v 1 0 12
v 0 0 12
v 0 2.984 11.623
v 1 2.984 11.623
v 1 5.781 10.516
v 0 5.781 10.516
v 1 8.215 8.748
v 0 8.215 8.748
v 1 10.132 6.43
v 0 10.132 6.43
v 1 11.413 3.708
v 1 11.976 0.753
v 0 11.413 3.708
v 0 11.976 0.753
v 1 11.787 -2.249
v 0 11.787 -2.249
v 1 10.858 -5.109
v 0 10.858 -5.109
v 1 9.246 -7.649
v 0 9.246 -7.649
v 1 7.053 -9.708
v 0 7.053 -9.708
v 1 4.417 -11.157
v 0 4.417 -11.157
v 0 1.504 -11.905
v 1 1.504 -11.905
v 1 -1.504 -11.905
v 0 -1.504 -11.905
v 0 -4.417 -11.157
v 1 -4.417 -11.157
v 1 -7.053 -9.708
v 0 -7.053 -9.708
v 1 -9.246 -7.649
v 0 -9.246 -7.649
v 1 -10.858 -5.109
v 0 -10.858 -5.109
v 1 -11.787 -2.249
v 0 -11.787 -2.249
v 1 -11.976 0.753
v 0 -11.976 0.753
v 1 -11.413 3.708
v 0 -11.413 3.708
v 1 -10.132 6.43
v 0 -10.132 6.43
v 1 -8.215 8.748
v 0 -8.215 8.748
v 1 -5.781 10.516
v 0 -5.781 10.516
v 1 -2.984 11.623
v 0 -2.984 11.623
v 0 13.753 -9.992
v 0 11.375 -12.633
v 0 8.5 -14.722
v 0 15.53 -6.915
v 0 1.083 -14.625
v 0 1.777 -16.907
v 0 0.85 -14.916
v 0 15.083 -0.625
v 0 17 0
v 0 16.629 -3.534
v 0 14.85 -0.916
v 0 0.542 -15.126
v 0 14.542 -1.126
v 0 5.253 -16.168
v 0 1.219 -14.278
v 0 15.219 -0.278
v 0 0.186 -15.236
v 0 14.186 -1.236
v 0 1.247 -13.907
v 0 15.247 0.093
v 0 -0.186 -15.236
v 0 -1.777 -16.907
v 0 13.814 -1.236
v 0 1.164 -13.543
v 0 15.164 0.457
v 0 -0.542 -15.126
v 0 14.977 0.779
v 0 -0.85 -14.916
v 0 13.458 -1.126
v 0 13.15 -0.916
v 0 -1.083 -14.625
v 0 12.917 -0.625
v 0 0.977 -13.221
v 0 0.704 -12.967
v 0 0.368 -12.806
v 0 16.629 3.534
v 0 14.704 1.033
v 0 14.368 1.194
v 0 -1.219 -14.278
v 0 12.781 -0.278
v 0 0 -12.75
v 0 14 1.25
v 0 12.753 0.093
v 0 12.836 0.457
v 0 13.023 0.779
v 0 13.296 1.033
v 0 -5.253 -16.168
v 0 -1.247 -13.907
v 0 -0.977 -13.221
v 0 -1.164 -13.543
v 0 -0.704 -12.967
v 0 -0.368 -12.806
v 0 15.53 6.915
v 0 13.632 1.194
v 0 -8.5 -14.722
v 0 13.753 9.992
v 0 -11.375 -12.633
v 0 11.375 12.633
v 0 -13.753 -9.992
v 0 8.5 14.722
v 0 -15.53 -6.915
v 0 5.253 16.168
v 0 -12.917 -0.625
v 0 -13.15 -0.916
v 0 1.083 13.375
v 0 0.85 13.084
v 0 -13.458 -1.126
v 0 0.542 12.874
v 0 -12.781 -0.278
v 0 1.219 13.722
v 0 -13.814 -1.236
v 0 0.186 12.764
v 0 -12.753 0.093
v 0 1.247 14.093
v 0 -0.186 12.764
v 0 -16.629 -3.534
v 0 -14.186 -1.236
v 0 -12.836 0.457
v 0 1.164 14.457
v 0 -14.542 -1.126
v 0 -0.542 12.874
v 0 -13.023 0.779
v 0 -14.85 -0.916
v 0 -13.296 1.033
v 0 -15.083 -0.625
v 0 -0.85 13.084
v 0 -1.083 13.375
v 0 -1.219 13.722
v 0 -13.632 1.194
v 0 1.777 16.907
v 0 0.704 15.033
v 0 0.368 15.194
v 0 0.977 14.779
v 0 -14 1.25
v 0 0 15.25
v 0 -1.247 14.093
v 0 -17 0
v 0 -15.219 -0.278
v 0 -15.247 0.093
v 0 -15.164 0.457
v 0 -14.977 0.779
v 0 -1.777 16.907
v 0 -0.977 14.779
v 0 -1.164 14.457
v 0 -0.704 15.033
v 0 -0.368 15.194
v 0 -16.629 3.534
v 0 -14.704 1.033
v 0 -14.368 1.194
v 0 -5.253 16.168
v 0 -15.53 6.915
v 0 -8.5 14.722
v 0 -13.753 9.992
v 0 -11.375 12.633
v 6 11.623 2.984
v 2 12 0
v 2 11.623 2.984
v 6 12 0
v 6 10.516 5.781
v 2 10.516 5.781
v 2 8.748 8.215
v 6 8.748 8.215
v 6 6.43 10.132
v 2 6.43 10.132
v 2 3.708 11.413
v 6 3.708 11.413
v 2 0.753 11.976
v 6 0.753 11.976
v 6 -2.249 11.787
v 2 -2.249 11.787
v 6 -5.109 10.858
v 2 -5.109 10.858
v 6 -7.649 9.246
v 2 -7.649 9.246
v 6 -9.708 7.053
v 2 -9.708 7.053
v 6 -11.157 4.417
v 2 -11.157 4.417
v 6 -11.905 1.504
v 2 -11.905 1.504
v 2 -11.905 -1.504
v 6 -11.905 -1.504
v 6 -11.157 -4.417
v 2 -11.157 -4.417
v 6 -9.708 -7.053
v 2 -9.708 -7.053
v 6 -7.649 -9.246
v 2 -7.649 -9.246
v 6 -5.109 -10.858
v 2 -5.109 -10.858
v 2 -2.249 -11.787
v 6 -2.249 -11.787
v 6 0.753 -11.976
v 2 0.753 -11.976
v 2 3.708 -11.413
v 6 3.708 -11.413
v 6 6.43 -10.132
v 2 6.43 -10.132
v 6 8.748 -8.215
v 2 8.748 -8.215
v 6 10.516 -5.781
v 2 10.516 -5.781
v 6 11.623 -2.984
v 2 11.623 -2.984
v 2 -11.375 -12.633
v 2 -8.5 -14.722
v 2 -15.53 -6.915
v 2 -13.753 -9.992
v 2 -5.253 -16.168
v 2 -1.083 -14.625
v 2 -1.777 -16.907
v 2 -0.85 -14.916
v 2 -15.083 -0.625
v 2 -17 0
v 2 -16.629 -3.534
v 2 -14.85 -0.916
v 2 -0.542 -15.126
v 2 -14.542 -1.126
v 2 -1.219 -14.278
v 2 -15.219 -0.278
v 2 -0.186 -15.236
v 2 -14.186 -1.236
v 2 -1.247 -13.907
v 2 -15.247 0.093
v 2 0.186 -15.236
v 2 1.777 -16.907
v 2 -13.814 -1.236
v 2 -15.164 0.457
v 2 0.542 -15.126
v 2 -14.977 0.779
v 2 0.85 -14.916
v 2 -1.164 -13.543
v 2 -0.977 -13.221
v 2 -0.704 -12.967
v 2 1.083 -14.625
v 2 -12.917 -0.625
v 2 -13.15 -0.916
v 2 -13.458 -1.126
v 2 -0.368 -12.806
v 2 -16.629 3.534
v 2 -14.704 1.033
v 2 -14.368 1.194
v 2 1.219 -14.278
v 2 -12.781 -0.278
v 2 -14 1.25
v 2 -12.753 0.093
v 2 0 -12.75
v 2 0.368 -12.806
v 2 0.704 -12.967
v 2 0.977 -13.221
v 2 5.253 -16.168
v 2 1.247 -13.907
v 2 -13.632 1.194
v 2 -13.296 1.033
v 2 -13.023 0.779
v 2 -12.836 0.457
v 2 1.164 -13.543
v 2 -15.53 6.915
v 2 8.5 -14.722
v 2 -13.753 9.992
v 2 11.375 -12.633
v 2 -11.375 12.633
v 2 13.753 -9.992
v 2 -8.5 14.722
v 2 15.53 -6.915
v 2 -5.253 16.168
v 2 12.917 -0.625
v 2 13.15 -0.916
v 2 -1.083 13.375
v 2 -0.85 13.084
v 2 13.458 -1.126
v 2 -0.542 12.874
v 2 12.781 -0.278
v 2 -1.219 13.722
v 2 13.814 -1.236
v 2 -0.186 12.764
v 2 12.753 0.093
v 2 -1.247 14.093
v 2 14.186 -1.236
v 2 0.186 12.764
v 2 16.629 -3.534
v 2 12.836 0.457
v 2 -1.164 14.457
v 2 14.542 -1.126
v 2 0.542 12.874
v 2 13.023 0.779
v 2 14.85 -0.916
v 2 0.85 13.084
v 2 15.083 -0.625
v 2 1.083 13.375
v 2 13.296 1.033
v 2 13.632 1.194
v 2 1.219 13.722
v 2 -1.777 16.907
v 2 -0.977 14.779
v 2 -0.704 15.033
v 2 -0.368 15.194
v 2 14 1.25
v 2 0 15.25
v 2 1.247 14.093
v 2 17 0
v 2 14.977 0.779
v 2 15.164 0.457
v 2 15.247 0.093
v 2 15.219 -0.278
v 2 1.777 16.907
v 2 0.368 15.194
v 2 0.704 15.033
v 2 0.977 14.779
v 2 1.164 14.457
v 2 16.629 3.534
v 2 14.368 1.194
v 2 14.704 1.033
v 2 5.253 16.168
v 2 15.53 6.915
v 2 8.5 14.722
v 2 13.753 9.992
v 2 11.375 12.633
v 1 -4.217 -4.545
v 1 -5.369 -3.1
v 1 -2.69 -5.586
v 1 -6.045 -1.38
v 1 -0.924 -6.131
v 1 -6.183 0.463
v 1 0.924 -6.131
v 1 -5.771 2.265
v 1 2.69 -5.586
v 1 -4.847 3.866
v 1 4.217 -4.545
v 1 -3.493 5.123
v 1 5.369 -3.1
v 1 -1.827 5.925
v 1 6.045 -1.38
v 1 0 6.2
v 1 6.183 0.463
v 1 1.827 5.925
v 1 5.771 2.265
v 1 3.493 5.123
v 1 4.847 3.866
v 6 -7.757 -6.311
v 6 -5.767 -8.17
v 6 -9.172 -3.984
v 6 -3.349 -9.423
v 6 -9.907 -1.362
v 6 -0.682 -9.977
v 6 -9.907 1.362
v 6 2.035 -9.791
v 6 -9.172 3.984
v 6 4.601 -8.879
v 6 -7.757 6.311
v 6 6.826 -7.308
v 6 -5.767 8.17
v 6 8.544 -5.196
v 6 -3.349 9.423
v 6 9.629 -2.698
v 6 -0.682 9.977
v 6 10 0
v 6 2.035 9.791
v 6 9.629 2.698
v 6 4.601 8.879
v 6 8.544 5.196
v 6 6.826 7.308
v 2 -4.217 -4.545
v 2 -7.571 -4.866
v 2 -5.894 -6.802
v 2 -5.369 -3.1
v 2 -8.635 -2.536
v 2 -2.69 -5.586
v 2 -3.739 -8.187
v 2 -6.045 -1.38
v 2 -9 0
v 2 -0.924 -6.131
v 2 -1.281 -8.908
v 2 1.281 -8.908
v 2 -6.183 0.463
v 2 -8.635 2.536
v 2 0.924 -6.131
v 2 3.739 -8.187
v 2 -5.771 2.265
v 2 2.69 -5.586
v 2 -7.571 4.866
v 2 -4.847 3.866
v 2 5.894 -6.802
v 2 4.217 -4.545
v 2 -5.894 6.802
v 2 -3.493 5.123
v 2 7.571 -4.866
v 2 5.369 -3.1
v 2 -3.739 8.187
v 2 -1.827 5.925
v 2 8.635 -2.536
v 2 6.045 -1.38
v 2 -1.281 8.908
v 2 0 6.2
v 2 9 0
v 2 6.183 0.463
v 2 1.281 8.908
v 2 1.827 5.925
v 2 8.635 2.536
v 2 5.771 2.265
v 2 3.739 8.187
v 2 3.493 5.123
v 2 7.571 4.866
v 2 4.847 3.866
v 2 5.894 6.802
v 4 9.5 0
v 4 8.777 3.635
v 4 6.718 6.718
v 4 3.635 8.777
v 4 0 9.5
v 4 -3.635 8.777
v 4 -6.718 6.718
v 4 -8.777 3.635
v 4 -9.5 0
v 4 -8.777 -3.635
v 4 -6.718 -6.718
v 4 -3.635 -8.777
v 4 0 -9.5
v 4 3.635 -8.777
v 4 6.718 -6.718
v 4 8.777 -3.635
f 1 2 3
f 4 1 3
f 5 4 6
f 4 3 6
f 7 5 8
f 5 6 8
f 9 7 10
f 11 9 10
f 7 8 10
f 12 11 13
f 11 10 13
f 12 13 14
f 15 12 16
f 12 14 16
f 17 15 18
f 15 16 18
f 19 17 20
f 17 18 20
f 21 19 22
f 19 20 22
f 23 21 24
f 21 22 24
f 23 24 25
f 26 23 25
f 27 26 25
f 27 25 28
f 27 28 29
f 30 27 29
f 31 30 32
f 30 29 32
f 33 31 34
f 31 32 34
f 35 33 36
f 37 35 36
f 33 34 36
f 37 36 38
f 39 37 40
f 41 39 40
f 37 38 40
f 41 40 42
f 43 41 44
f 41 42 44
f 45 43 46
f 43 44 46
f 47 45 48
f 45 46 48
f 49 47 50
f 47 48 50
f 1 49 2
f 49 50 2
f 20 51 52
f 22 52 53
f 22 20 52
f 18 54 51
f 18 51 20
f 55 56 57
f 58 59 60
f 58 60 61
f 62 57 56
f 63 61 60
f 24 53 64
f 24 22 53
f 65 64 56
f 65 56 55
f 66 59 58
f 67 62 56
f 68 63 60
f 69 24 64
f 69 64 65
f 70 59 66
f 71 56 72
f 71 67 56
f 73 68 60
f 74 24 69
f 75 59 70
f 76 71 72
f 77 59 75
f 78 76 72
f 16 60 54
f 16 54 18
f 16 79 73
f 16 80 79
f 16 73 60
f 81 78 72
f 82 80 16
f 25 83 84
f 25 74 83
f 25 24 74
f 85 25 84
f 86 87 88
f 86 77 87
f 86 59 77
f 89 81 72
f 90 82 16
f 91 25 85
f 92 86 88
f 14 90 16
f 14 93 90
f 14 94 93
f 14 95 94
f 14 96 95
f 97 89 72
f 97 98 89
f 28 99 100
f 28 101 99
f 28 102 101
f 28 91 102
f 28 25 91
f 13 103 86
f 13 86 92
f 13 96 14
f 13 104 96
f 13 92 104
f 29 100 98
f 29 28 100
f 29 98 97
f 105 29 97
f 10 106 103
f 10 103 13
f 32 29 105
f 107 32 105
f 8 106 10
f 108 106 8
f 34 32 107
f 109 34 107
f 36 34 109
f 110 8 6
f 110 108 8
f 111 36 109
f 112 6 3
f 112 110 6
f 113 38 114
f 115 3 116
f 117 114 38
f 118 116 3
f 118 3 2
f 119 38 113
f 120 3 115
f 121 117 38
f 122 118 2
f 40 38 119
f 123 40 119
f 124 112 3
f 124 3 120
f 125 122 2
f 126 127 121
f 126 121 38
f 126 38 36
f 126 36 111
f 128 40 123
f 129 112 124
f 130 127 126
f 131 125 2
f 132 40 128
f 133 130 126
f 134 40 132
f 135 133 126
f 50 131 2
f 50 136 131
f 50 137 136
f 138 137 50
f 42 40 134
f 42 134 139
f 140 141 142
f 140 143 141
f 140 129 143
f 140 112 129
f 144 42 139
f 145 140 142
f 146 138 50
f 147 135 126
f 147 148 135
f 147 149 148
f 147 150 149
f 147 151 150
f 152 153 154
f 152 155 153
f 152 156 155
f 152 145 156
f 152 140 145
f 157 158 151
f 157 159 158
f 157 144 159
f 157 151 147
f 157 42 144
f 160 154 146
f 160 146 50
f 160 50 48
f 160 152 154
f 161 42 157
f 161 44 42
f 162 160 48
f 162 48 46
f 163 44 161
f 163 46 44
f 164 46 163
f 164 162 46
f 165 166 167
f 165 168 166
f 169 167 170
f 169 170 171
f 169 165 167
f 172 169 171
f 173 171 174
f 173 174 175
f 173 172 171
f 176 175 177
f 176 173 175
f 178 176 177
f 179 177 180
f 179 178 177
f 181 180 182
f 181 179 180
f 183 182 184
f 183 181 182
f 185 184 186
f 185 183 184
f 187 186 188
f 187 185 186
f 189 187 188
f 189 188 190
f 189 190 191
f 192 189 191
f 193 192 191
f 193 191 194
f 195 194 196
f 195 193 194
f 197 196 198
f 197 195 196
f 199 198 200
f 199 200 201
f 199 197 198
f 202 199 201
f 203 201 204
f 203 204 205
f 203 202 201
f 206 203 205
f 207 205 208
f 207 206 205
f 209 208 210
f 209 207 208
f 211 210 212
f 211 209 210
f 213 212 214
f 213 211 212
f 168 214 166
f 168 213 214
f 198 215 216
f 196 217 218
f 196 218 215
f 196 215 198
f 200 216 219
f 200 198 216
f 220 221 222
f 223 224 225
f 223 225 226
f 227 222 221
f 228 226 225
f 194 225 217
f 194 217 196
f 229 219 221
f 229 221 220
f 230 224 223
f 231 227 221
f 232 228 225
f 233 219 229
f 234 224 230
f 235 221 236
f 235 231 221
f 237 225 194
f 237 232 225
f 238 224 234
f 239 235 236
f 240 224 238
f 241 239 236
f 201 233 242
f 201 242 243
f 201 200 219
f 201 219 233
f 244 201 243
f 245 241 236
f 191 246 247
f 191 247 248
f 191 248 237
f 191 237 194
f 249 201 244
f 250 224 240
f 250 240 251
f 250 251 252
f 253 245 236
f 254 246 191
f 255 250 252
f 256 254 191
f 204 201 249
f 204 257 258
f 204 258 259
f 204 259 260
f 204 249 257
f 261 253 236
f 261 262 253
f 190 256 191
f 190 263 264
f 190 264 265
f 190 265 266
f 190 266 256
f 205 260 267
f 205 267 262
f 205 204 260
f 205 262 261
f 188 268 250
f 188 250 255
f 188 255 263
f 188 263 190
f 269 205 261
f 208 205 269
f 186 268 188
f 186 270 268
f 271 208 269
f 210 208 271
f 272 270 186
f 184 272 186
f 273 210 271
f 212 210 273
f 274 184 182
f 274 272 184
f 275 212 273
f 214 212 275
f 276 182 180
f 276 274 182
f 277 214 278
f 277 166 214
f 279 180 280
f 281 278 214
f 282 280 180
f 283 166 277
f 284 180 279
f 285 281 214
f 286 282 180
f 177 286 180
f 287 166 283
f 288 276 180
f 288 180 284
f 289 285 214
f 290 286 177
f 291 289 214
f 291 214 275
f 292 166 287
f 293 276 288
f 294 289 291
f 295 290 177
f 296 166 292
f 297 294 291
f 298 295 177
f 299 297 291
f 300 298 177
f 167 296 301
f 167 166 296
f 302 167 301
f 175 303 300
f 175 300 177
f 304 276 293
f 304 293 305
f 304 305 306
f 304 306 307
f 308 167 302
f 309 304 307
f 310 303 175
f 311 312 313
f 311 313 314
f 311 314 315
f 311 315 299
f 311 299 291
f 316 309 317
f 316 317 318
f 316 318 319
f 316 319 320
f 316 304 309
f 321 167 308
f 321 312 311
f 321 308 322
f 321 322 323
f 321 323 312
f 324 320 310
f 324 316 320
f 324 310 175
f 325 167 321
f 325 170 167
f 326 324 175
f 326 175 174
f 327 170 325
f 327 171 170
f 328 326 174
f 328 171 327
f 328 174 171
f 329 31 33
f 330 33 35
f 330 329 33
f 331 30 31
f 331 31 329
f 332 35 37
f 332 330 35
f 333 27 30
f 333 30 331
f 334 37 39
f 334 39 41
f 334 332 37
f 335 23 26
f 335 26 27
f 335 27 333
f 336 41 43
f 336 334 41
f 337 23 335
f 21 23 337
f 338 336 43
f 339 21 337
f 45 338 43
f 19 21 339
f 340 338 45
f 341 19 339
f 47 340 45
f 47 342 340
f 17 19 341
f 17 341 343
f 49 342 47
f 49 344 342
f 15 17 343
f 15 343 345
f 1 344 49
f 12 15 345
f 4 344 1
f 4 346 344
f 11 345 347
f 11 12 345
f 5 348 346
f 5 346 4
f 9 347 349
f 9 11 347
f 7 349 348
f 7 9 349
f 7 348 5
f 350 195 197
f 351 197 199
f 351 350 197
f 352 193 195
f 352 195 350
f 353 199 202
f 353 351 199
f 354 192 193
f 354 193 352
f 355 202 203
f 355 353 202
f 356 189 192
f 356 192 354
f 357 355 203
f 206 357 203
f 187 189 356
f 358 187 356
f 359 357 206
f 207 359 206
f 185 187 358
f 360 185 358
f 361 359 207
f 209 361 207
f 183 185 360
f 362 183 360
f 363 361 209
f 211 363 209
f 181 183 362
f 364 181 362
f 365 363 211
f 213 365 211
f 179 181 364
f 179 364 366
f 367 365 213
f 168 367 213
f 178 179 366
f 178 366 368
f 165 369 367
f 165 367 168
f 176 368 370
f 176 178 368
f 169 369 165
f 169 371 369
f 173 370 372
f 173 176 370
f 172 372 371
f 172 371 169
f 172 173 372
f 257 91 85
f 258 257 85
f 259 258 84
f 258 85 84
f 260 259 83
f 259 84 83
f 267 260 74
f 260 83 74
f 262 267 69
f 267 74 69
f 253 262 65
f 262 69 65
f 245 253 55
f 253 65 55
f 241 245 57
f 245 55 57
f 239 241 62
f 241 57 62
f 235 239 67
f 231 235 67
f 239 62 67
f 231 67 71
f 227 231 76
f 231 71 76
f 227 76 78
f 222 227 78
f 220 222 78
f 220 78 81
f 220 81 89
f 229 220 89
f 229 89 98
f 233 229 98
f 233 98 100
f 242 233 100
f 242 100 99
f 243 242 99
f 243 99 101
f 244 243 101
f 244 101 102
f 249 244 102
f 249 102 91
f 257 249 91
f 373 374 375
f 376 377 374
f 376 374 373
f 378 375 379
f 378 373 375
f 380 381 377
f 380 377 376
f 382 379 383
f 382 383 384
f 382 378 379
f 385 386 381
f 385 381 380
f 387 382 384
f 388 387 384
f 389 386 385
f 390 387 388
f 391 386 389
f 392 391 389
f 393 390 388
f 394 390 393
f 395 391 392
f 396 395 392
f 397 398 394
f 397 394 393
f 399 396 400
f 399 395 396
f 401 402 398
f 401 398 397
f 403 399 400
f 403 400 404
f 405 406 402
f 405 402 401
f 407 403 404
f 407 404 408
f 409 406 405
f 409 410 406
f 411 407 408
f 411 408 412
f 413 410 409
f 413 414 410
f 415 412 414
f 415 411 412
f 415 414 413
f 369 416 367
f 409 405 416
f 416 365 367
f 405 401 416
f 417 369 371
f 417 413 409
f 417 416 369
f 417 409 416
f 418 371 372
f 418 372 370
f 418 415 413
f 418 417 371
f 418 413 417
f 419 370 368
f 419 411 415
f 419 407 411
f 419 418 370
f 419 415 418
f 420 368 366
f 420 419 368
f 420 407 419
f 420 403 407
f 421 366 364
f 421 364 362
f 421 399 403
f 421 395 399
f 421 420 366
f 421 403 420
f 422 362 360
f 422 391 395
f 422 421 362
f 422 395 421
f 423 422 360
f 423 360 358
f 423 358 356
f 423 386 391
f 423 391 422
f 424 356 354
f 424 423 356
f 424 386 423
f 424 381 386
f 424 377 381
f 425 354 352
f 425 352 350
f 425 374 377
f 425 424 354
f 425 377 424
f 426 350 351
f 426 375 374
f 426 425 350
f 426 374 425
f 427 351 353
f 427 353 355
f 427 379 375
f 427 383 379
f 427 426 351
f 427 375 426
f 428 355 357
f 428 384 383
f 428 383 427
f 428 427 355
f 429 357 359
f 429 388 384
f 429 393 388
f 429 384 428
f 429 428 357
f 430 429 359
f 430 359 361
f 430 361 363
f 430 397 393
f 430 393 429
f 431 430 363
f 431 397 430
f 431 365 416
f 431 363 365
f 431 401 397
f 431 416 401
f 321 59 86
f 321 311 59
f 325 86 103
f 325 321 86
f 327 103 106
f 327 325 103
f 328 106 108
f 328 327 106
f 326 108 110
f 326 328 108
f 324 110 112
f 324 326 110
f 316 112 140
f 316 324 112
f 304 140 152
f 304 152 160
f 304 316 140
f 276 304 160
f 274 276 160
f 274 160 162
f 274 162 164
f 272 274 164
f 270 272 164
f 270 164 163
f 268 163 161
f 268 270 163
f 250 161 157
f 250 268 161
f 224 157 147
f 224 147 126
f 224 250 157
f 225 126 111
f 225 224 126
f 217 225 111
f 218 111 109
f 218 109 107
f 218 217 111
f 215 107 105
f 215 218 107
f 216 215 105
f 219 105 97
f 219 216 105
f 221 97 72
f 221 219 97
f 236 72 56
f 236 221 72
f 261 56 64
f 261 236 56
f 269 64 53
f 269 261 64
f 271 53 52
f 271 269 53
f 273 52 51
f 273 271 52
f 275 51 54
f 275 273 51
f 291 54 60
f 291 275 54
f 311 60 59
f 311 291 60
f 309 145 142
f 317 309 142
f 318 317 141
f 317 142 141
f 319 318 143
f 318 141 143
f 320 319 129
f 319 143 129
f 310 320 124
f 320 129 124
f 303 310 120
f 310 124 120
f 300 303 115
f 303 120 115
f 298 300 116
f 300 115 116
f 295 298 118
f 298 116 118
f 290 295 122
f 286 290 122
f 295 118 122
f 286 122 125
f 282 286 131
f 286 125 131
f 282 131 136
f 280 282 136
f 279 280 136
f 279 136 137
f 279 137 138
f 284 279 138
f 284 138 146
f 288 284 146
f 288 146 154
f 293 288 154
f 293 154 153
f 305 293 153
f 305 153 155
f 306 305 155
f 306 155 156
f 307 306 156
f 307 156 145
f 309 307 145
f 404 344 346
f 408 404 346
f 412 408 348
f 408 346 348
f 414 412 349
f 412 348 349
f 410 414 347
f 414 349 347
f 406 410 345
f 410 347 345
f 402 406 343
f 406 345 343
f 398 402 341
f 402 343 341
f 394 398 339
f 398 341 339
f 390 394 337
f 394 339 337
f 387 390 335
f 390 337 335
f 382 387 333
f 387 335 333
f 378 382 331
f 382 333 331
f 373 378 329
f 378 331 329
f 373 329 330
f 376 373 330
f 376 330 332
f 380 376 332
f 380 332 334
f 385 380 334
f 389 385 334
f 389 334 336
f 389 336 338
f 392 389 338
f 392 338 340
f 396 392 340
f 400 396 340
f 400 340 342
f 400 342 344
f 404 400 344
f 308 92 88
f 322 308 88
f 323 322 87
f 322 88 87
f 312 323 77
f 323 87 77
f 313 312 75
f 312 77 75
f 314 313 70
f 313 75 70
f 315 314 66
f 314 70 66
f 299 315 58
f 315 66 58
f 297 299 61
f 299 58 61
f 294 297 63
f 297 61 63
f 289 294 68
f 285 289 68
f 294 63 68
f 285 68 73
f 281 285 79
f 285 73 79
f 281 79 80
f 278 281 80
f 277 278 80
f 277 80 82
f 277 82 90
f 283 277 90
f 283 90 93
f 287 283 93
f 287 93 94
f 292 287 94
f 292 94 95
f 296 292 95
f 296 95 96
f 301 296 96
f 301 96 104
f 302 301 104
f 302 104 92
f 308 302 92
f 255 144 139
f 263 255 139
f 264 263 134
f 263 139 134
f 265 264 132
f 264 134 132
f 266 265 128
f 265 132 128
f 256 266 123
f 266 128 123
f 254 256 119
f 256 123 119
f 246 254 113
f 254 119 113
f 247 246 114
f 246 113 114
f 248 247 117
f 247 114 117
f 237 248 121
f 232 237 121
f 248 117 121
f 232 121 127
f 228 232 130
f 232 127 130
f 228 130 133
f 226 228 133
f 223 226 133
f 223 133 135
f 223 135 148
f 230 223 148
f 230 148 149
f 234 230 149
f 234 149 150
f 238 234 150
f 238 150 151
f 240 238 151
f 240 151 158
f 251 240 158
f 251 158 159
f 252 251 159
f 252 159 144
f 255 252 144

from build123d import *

# Parameters (mm, degrees)
CUT_EXTRUDE3_REACH = 8
SKETCH4_R          = 1.25
SKETCH2_R          = 12
CUT_EXTRUDE4_DEPTH = 1
CUT_EXTRUDE5_REACH = 7
SKETCH5_R          = 6.2


with BuildPart() as part:
    # Sketch1 → Revolve1 (revolve)
    with BuildSketch(Plane.XY):
        Polygon((0, 0), (0, 17), (2, 17), (2, 12), (6, 12), (6, 10), (2, 9), (2, 0), align=None)
    revolve(axis=Axis((0, 0, 0), (1, 0, 0)))

    # Sketch4 → Cut-Extrude3 (cut, up to next)
    with BuildSketch(Plane.ZY, mode=Mode.PRIVATE) as cut_extrude3_sk1:
        with Locations((0, 14)):
            Circle(SKETCH4_R)
    cut_extrude3_tool1 = extrude(cut_extrude3_sk1.sketch, amount=-CUT_EXTRUDE3_REACH, mode=Mode.PRIVATE) & part.part
    add(cut_extrude3_tool1.solids().sort_by_distance((0, 14, 0))[0], mode=Mode.SUBTRACT)
    # Sketch4 → Cut-Extrude3 (cut, up to next)
    with BuildSketch(Plane.ZY, mode=Mode.PRIVATE) as cut_extrude3_sk2:
        with Locations((14, 0)):
            Circle(SKETCH4_R)
    cut_extrude3_tool2 = extrude(cut_extrude3_sk2.sketch, amount=-CUT_EXTRUDE3_REACH, mode=Mode.PRIVATE) & part.part
    add(cut_extrude3_tool2.solids().sort_by_distance((0, 0, 14))[0], mode=Mode.SUBTRACT)
    # Sketch4 → Cut-Extrude3 (cut, up to next)
    with BuildSketch(Plane.ZY, mode=Mode.PRIVATE) as cut_extrude3_sk3:
        with Locations((0, -14)):
            Circle(SKETCH4_R)
    cut_extrude3_tool3 = extrude(cut_extrude3_sk3.sketch, amount=-CUT_EXTRUDE3_REACH, mode=Mode.PRIVATE) & part.part
    add(cut_extrude3_tool3.solids().sort_by_distance((0, -14, 0))[0], mode=Mode.SUBTRACT)
    # Sketch4 → Cut-Extrude3 (cut, up to next)
    with BuildSketch(Plane.ZY, mode=Mode.PRIVATE) as cut_extrude3_sk4:
        with Locations((-14, 0)):
            Circle(SKETCH4_R)
    cut_extrude3_tool4 = extrude(cut_extrude3_sk4.sketch, amount=-CUT_EXTRUDE3_REACH, mode=Mode.PRIVATE) & part.part
    add(cut_extrude3_tool4.solids().sort_by_distance((0, 0, -14))[0], mode=Mode.SUBTRACT)

    # Sketch2 → Cut-Extrude4 (cut)
    with BuildSketch(Plane.ZY):
        Circle(SKETCH2_R)
    extrude(amount=-CUT_EXTRUDE4_DEPTH, mode=Mode.SUBTRACT)

    # Sketch5 → Cut-Extrude5 (cut, up to next)
    with BuildSketch(Plane.ZY.offset(-1), mode=Mode.PRIVATE) as cut_extrude5_sk1:
        Circle(SKETCH5_R)
    cut_extrude5_tool1 = extrude(cut_extrude5_sk1.sketch, amount=-CUT_EXTRUDE5_REACH, mode=Mode.PRIVATE) & part.part
    add(cut_extrude5_tool1.solids().sort_by_distance((1, 0, 0))[0], mode=Mode.SUBTRACT)


solid = part.part
